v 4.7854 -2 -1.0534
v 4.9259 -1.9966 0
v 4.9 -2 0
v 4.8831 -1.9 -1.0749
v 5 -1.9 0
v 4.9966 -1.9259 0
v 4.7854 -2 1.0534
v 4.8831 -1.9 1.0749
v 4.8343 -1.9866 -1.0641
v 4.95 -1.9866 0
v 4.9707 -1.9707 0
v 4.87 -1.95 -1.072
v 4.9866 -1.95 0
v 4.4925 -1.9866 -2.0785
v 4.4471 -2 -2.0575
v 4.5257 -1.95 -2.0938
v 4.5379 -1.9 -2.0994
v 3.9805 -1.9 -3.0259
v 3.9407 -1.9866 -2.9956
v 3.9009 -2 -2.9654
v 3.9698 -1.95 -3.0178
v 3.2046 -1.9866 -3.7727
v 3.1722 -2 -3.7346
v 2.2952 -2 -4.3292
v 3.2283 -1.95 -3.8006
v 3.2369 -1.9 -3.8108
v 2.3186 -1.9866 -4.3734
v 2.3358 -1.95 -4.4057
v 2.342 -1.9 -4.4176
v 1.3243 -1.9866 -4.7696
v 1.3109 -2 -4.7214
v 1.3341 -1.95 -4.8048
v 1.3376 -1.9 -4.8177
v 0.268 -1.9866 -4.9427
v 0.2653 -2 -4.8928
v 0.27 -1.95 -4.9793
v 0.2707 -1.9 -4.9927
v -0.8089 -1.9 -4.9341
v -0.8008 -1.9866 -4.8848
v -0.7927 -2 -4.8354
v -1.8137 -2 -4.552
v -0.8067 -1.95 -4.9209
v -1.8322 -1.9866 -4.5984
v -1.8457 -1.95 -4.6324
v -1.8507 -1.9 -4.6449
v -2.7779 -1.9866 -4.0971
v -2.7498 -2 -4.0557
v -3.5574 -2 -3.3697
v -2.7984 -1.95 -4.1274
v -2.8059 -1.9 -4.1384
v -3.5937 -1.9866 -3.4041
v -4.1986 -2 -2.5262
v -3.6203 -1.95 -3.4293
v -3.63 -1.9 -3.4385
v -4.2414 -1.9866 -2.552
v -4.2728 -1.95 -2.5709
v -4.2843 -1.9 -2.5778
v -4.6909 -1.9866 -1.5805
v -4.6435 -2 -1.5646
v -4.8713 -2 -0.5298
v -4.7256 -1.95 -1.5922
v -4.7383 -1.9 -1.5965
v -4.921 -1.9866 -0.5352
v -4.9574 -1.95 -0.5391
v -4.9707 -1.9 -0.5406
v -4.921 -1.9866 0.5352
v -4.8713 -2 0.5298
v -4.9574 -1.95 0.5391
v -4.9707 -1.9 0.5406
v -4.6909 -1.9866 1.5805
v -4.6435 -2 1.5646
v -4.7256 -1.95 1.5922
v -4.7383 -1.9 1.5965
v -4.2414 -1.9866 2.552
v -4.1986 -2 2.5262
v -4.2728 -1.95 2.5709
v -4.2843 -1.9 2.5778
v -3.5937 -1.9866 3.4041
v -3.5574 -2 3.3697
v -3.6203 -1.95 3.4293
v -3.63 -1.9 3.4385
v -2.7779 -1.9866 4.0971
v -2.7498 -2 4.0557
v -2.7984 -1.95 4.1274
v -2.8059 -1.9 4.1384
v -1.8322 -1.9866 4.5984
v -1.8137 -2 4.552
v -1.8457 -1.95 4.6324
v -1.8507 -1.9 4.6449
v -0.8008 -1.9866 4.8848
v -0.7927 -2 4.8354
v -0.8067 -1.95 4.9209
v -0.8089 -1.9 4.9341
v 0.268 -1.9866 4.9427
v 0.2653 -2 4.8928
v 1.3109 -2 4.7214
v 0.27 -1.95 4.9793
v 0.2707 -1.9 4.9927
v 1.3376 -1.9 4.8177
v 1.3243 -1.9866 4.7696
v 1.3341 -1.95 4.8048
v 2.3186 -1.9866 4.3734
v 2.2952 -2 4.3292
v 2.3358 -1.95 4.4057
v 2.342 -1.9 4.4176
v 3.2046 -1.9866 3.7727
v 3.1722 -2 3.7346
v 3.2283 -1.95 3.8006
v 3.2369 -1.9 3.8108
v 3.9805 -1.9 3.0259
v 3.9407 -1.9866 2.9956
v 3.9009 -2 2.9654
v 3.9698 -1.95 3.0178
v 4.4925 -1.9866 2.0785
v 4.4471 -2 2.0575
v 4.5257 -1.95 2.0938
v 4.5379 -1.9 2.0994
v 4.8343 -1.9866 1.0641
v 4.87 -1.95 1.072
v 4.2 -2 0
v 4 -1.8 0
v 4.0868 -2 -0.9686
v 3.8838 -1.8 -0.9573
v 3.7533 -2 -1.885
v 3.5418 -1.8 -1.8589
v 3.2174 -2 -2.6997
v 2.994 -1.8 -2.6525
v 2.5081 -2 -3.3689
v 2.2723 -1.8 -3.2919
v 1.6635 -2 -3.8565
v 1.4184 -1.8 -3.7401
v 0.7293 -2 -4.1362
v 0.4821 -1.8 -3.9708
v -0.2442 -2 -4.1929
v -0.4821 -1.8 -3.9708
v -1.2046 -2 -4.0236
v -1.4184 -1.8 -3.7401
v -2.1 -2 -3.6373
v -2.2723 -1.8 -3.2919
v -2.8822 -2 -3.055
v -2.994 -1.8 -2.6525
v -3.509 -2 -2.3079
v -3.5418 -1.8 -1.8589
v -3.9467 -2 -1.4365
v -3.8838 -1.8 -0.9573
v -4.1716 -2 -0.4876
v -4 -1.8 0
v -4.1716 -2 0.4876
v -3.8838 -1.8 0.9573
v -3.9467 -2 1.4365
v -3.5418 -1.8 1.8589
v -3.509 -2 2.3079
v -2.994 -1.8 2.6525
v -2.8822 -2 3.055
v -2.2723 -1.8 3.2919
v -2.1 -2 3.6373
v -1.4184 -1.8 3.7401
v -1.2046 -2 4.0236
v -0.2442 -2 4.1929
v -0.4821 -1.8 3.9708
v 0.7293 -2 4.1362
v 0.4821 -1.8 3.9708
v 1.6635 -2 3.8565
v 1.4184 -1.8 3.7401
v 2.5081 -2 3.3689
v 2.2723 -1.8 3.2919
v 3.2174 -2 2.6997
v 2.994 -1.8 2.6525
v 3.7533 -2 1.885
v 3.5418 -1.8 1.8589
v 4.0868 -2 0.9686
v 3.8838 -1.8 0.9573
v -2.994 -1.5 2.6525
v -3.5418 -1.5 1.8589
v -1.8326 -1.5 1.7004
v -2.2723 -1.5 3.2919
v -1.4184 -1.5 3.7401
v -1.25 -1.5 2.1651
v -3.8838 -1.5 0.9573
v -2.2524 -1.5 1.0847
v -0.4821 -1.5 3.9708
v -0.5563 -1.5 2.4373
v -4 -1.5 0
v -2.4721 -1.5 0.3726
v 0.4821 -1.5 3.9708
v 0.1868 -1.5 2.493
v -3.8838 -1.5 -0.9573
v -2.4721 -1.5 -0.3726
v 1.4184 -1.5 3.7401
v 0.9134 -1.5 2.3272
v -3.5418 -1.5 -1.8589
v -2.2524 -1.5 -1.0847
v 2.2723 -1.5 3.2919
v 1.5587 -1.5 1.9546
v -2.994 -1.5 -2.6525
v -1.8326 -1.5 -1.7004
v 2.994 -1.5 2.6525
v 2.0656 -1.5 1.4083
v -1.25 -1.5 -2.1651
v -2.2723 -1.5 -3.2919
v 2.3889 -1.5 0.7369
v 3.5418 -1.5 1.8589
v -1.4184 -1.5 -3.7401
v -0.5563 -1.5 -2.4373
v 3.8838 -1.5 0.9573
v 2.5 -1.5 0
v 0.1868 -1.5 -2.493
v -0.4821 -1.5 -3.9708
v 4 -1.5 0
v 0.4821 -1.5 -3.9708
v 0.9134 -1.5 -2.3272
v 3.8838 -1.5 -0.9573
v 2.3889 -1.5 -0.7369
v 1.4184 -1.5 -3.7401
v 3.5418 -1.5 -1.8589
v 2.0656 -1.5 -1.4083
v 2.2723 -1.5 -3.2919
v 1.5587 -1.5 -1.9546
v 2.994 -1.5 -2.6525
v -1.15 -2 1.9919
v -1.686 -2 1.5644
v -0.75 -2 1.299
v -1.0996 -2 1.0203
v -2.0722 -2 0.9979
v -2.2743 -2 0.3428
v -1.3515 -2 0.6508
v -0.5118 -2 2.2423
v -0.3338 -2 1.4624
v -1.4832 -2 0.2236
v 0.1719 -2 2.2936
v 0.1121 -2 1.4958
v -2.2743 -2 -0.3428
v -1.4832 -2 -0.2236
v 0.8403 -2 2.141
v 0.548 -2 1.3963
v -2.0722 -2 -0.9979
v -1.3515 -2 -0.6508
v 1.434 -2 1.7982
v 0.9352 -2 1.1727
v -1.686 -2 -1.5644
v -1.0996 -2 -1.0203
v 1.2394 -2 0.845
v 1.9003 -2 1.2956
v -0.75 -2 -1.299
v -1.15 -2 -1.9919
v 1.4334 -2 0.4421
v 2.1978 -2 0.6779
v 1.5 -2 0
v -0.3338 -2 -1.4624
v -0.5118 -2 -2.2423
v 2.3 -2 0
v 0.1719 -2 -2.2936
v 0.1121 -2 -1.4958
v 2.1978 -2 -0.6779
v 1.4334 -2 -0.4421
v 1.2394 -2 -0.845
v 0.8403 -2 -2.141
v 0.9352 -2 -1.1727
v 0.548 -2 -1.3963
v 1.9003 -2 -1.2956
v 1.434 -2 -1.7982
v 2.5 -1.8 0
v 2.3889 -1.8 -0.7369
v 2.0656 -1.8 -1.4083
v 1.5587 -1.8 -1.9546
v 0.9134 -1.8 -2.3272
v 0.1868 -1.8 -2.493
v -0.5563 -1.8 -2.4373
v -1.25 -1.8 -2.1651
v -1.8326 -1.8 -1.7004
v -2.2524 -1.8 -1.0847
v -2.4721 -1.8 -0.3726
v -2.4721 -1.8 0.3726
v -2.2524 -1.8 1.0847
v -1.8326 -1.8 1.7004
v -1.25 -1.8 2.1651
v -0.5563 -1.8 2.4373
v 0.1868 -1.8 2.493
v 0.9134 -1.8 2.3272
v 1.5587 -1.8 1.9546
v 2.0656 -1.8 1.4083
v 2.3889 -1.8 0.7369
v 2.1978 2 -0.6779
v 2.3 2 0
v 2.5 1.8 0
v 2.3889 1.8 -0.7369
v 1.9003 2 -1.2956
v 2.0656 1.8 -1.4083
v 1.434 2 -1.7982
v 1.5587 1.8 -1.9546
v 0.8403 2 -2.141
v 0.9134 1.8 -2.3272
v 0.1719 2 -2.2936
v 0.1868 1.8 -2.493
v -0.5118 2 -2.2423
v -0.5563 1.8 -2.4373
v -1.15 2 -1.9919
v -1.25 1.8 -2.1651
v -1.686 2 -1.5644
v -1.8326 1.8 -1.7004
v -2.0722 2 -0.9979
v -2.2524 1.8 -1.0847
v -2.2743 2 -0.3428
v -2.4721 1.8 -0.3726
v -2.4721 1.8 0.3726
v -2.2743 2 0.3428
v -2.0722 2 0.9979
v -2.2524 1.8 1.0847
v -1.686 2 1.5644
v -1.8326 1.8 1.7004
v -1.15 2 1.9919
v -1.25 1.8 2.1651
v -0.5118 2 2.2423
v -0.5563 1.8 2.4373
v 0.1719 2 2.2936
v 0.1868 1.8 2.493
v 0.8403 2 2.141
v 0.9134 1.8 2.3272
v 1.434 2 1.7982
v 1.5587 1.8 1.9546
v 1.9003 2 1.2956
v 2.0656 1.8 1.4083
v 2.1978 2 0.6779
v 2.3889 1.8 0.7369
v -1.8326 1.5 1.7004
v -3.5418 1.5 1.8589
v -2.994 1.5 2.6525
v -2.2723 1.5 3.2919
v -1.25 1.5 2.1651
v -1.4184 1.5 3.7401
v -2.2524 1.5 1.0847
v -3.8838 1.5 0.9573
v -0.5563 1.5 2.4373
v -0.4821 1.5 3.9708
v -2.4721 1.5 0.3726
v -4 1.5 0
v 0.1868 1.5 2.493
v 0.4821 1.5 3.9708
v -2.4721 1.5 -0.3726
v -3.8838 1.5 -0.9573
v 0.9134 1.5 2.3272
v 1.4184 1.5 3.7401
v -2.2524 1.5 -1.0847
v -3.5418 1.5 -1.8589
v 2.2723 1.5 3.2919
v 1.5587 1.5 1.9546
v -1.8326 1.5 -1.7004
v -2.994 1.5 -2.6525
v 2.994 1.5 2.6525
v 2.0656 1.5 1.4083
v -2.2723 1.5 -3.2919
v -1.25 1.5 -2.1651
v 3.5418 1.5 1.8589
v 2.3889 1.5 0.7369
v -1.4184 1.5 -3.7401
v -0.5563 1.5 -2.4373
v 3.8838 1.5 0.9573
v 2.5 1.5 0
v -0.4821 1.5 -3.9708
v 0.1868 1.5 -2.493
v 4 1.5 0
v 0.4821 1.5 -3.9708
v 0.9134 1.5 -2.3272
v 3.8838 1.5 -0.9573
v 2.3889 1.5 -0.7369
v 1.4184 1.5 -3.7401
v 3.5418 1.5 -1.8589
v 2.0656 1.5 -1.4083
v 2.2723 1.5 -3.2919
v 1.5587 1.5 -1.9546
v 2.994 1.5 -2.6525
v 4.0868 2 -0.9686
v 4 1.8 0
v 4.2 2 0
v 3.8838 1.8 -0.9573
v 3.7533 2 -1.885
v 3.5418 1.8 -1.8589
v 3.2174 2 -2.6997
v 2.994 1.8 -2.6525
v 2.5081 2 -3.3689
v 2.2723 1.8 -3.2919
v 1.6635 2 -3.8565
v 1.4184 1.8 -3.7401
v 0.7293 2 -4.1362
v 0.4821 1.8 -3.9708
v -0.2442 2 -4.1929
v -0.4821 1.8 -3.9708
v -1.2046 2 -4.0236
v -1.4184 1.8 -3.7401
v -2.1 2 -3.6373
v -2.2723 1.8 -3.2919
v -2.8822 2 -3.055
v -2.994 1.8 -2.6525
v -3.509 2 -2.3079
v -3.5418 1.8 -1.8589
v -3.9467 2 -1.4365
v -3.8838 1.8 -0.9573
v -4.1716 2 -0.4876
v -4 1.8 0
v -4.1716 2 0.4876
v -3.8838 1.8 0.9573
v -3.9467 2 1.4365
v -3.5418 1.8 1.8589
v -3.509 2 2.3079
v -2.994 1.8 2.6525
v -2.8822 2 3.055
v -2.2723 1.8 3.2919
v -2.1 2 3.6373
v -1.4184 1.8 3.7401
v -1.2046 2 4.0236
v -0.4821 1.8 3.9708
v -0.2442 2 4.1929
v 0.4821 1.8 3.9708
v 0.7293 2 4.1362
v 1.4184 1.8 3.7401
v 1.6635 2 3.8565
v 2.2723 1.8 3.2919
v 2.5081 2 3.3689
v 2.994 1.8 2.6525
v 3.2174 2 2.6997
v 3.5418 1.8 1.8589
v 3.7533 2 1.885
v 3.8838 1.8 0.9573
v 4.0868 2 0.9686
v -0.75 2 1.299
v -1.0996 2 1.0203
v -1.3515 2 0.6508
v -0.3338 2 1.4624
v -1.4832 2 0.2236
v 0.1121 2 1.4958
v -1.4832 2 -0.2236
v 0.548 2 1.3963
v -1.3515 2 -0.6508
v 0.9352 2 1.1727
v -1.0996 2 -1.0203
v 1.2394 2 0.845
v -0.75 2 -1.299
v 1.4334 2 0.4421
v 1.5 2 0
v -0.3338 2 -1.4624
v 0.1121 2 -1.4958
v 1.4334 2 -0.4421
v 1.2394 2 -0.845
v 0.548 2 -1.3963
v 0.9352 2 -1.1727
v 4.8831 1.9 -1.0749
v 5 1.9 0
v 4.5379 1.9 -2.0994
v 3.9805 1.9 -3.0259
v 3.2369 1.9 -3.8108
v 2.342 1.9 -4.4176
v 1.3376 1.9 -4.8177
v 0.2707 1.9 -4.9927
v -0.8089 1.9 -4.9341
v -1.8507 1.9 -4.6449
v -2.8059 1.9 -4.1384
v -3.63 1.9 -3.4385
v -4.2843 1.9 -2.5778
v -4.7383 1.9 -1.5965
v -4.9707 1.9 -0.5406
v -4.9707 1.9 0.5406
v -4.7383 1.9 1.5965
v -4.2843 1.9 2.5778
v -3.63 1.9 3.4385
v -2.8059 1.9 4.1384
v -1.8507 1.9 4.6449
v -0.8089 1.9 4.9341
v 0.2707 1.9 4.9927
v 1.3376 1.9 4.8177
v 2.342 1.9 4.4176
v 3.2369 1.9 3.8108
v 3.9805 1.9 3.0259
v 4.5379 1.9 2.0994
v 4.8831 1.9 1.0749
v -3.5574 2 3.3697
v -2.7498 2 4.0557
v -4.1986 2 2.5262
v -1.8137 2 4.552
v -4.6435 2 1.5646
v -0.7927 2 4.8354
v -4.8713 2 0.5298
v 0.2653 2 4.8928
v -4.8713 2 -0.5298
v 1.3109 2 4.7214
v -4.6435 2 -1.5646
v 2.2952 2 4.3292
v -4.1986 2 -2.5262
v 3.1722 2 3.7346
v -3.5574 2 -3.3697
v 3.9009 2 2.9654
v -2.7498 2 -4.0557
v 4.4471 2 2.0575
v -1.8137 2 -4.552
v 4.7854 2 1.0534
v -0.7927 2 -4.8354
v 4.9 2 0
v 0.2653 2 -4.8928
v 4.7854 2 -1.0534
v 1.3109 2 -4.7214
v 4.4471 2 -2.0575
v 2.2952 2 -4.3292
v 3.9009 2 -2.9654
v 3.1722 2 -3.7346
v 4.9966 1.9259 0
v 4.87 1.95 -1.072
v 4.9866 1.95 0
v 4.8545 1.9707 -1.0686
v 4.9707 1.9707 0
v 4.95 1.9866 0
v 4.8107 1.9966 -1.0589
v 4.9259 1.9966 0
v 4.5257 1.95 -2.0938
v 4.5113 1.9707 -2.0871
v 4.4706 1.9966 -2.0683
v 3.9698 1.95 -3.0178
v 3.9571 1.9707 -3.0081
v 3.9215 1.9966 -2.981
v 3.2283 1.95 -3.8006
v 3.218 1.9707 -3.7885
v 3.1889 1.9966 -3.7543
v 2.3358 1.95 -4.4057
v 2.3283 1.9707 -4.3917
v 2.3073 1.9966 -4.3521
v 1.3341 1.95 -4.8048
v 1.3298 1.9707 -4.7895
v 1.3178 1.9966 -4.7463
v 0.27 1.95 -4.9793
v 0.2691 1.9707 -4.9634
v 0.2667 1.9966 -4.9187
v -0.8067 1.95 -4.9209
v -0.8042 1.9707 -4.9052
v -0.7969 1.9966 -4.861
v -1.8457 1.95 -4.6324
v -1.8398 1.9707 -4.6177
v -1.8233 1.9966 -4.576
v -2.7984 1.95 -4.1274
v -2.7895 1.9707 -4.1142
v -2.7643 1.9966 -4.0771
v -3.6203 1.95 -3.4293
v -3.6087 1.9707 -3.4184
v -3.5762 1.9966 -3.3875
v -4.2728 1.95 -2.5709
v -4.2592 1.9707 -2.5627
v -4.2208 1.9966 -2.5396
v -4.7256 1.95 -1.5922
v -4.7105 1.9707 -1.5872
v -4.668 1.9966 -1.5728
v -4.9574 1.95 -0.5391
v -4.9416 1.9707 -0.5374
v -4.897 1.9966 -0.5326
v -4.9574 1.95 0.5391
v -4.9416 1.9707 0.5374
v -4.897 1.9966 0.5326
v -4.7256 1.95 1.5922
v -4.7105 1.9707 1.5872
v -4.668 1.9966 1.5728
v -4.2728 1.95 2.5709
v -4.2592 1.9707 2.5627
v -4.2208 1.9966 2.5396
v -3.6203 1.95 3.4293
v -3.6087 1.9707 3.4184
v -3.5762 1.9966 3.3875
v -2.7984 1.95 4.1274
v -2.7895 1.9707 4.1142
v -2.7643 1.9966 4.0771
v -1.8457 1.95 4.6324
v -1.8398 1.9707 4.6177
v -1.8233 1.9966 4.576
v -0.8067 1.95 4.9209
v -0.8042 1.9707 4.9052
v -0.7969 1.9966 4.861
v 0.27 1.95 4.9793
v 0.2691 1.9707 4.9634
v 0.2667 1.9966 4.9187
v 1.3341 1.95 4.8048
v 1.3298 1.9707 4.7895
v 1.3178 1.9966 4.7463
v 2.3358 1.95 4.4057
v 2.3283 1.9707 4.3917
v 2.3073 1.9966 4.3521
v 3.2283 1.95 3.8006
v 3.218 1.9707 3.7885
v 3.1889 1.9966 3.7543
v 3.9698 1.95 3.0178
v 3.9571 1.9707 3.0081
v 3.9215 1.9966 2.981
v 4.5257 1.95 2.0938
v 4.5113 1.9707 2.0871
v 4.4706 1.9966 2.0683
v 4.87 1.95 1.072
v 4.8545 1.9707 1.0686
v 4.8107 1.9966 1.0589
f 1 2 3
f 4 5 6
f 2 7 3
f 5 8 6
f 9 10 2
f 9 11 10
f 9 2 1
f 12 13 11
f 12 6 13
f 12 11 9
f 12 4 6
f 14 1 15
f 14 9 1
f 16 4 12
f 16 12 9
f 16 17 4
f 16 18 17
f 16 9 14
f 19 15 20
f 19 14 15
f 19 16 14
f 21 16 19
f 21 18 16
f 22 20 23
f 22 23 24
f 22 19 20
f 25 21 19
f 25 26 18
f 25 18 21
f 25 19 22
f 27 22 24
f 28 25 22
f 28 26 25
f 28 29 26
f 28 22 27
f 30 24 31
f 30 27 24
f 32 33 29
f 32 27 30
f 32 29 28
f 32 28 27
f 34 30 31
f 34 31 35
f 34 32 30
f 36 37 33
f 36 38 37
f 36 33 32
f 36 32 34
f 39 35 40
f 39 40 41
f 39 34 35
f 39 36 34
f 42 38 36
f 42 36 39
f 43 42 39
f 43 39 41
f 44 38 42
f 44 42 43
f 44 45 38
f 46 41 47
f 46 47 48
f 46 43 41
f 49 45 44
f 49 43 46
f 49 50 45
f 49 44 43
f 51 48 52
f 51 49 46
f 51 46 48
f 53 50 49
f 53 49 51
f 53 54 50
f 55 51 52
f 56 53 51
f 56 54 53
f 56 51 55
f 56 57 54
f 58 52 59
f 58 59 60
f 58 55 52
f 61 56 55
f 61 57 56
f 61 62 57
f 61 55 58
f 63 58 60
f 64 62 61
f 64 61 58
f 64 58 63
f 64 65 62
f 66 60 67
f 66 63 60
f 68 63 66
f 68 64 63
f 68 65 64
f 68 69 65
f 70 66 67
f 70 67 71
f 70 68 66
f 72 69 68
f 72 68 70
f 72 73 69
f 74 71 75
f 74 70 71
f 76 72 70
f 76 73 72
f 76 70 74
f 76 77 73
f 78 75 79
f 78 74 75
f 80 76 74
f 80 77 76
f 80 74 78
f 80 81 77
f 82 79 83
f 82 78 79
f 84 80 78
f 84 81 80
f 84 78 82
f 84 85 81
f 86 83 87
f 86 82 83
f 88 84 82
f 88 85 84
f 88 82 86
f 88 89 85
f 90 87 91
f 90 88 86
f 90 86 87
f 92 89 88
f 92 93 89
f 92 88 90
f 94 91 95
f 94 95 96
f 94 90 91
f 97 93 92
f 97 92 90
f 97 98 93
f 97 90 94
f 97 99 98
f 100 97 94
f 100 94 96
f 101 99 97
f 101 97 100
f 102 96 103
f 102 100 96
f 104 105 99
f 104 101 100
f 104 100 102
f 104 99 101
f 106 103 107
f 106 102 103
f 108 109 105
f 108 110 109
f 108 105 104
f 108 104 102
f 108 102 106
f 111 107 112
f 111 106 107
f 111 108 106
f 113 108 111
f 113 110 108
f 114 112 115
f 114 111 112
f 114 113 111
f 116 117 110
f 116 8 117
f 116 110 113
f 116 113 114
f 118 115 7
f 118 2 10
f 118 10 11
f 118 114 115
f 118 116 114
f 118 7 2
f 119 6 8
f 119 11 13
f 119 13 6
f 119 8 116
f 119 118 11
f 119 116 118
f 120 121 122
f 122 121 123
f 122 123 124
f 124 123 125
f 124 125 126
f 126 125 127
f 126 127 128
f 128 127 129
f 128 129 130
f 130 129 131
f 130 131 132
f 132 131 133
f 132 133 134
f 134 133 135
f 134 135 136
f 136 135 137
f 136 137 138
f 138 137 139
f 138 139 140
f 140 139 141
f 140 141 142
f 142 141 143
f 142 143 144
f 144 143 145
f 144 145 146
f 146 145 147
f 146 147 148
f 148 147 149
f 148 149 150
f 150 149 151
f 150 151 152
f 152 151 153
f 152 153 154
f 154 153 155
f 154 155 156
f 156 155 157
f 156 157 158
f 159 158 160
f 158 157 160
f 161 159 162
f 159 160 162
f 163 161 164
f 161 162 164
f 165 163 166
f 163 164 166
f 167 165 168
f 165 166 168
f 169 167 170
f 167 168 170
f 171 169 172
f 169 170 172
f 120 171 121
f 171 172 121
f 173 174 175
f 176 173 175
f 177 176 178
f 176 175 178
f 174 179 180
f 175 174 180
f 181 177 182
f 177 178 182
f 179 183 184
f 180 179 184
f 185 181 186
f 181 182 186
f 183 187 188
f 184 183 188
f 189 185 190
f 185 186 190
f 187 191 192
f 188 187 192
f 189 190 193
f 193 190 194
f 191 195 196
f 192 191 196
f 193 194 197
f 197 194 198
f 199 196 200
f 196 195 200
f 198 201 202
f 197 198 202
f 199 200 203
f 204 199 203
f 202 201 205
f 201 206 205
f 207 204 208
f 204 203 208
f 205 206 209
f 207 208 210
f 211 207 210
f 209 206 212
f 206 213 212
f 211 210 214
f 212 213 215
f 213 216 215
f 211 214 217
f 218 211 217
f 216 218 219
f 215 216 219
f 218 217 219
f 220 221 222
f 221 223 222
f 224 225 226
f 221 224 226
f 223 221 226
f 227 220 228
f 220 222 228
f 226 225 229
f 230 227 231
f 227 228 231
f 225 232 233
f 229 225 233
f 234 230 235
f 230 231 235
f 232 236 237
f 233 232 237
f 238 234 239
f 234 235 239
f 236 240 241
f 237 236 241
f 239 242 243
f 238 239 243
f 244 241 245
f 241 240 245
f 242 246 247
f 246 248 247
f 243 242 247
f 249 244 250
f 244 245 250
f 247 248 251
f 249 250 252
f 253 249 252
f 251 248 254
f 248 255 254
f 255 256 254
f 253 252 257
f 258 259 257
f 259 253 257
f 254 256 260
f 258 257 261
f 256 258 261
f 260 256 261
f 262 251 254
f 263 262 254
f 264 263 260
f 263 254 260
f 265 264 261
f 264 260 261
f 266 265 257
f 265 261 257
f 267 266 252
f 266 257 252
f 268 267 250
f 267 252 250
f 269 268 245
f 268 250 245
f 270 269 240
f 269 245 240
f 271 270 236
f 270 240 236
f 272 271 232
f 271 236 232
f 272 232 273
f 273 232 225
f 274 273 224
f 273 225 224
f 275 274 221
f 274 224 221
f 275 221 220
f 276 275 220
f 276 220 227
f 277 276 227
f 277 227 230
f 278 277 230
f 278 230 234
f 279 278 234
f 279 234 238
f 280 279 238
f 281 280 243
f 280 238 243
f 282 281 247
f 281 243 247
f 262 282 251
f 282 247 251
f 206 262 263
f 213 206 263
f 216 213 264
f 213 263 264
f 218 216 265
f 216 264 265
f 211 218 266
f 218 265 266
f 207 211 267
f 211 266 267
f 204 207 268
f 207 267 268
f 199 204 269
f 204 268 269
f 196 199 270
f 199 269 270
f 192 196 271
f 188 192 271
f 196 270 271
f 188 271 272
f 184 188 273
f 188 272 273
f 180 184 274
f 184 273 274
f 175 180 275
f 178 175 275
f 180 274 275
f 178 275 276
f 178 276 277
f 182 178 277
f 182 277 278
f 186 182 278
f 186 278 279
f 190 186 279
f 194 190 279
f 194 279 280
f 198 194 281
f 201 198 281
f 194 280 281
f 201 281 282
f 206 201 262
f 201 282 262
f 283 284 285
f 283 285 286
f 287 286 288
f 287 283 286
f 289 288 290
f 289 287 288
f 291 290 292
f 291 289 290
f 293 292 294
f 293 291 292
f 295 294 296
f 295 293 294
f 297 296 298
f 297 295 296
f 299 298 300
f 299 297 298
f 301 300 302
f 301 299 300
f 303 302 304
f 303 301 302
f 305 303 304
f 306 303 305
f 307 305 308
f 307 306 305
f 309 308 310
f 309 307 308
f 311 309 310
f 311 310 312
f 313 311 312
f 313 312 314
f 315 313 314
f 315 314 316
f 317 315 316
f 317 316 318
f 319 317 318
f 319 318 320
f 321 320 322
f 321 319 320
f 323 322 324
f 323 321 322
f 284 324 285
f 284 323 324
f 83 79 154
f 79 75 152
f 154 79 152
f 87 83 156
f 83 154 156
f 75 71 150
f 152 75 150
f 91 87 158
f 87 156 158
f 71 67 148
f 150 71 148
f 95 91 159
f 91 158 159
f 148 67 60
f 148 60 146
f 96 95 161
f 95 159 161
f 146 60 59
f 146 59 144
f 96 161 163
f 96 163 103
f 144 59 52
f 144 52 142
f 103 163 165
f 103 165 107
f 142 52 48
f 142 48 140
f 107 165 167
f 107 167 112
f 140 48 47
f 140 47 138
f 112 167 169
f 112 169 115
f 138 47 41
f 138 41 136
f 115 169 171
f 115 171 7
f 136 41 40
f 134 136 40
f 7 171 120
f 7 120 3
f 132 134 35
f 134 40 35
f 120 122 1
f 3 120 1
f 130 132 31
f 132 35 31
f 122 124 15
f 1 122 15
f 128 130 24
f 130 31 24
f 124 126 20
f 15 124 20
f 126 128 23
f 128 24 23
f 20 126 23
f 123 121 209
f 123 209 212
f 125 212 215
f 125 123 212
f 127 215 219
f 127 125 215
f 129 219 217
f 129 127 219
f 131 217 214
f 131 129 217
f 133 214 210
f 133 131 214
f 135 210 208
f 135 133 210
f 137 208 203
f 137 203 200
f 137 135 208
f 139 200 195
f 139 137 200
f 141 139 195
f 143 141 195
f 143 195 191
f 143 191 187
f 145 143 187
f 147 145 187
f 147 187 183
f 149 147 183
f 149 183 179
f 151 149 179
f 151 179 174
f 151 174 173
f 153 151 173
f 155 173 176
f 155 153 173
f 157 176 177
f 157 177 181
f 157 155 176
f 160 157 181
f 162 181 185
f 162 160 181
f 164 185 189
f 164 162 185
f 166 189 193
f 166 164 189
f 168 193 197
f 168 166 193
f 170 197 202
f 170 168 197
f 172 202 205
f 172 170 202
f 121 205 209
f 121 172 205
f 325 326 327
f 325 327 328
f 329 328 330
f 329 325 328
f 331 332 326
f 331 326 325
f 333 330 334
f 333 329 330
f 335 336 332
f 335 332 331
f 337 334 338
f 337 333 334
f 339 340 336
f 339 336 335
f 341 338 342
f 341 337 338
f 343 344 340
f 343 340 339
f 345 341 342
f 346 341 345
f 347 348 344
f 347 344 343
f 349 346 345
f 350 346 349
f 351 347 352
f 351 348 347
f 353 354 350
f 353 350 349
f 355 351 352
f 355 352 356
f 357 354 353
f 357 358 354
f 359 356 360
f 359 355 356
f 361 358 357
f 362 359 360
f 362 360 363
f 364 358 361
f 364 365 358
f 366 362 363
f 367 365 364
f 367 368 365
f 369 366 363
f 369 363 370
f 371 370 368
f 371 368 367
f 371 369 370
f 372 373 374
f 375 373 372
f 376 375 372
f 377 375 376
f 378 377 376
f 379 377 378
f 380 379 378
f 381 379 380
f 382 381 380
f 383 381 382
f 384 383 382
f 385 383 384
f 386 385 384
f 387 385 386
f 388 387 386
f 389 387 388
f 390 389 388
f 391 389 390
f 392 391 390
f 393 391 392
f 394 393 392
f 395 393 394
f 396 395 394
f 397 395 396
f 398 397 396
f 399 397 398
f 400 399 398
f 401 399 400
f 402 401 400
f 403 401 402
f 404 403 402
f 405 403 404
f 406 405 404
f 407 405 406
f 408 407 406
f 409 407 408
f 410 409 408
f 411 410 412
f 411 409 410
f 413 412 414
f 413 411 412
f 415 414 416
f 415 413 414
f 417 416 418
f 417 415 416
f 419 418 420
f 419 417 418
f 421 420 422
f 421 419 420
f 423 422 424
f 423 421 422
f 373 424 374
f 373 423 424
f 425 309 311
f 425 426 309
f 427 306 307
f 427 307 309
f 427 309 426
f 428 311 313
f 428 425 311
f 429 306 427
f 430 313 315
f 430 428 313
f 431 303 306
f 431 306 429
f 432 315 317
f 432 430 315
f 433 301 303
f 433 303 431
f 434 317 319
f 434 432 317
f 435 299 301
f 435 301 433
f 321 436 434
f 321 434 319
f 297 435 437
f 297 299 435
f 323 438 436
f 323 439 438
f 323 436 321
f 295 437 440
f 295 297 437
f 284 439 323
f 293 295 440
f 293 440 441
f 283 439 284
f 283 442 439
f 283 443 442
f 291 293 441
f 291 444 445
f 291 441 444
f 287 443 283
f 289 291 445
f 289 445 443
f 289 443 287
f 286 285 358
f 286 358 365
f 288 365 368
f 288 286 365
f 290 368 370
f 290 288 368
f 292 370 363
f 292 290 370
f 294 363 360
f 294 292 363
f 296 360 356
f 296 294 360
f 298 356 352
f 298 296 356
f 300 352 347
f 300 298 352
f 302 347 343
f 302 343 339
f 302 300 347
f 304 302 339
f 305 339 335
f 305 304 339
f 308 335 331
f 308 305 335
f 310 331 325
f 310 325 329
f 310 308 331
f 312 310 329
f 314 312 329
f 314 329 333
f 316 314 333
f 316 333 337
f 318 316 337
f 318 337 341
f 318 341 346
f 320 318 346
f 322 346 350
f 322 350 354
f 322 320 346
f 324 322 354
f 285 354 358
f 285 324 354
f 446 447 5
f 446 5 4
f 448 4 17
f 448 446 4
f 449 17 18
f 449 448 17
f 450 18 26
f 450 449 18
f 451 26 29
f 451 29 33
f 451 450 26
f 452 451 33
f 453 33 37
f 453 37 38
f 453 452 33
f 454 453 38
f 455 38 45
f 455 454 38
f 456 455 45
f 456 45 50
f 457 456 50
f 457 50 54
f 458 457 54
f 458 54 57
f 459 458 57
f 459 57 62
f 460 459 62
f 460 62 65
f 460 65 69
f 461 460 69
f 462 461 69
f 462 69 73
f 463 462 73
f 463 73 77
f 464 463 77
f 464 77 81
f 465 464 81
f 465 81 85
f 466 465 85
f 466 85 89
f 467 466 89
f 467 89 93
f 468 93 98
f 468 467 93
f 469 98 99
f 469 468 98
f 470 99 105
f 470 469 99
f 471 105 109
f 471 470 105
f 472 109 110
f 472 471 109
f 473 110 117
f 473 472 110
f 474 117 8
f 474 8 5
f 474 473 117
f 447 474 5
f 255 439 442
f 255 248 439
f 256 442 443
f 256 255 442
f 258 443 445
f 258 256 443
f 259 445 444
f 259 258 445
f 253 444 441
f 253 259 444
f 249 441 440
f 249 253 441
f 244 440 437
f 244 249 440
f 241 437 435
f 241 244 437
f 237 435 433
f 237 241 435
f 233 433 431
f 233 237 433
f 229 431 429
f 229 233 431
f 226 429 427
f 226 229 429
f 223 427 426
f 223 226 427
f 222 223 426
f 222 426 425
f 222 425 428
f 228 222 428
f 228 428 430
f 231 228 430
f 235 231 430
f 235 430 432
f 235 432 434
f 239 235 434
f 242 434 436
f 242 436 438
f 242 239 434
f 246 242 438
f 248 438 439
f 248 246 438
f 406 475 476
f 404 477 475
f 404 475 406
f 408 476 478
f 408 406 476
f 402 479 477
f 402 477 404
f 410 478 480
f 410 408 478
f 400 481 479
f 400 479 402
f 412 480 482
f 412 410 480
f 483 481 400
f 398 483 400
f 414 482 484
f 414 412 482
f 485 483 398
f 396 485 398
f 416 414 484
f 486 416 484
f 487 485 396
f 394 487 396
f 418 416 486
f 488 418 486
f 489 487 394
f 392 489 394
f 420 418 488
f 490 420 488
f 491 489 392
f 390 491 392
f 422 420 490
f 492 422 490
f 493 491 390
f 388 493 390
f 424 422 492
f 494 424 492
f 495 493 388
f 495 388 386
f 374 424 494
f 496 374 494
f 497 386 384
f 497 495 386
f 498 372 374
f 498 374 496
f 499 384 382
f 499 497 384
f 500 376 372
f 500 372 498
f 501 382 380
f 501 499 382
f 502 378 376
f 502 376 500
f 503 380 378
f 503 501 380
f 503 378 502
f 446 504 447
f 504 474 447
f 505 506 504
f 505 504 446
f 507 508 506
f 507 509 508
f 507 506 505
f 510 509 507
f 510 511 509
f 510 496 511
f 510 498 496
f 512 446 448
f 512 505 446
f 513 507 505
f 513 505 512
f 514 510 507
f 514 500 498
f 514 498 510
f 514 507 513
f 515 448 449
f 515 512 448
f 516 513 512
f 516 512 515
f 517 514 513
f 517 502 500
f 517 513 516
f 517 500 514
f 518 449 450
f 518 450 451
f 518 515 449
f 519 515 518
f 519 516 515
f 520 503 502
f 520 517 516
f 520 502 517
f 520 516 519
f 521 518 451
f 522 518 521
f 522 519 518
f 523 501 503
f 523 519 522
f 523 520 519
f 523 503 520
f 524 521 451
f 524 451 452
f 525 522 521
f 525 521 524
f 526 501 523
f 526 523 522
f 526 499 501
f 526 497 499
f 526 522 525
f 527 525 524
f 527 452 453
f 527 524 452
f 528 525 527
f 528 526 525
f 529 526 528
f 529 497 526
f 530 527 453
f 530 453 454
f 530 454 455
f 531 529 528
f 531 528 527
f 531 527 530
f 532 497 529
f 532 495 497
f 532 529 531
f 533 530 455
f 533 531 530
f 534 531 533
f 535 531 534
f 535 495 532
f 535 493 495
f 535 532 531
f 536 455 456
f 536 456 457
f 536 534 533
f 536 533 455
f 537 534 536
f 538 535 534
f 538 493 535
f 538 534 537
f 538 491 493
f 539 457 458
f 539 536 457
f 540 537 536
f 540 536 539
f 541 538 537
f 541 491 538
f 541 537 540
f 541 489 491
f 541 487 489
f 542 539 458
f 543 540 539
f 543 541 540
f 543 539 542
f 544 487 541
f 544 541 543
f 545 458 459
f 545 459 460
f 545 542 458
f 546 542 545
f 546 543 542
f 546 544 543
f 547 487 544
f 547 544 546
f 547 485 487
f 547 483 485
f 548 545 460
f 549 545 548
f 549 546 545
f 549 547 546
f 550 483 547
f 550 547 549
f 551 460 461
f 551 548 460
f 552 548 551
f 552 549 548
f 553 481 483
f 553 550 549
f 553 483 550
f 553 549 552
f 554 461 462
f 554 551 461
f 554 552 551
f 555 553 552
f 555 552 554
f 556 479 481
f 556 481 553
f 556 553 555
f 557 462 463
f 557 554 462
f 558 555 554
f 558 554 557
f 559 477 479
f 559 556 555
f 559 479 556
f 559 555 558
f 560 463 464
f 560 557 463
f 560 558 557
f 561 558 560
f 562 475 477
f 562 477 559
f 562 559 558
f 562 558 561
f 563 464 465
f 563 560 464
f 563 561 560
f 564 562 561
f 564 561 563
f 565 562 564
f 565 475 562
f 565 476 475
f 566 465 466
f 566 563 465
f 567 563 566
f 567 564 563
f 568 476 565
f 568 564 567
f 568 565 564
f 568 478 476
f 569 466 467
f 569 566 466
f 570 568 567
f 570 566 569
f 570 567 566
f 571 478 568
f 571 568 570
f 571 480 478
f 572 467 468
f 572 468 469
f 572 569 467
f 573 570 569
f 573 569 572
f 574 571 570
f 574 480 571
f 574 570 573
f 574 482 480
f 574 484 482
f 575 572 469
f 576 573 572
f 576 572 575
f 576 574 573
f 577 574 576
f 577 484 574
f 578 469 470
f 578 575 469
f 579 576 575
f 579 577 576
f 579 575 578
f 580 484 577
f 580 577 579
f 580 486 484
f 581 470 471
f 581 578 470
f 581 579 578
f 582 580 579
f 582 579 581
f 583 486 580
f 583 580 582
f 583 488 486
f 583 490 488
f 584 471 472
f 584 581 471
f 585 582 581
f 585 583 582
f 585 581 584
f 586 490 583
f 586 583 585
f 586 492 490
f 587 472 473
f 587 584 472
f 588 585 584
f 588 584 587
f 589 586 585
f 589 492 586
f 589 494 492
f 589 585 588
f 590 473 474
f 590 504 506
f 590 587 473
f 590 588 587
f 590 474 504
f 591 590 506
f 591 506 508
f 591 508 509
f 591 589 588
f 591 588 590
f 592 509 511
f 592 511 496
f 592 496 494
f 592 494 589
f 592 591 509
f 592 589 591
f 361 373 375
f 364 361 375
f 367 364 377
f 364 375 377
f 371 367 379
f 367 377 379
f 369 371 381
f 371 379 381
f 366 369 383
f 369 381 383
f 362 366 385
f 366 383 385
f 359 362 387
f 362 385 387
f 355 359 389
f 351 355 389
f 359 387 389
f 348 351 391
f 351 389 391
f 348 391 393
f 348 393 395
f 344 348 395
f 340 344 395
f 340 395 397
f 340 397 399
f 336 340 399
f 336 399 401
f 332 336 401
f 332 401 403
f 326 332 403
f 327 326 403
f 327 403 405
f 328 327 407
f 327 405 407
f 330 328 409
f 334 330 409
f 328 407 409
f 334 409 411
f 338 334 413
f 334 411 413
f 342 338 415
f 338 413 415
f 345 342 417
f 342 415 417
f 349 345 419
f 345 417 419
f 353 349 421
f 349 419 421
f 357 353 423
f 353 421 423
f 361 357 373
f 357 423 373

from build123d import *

# Parameters (mm, degrees)
SKETCH2_R           = 5
SKETCH2_R_2         = 1.5
BOSS_EXTRUDE1_DEPTH = 2
SKETCH3_R           = 4
SKETCH3_R_2         = 2.5
CUT_EXTRUDE1_DEPTH  = 0.5
CHAMFER1_SIZE       = 0.2
FILLET1_R           = 0.1


with BuildPart() as part:
    # Sketch2 → Boss-Extrude1 (new body, symmetric)
    with BuildSketch(Plane(origin=(0, 0, 0), x_dir=(1, 0, 0), z_dir=(0, 1, 0))):
        Circle(SKETCH2_R)
        Circle(SKETCH2_R_2, mode=Mode.SUBTRACT)
    extrude(amount=BOSS_EXTRUDE1_DEPTH, both=True)

    # Sketch3 → Cut-Extrude1 (cut)
    with BuildSketch(Plane(origin=(0, 2, 0), x_dir=(1, 0, 0), z_dir=(0, 1, 0))):
        Circle(SKETCH3_R)
        Circle(SKETCH3_R_2, mode=Mode.SUBTRACT)
    cut_extrude1 = extrude(amount=-CUT_EXTRUDE1_DEPTH, mode=Mode.SUBTRACT)

    # Mirror1: Cut-Extrude1 across plane
    add(cut_extrude1.mirror(Plane.ZX), mode=Mode.SUBTRACT)

    # Chamfer1
    chamfer1_edges = [part.edges().sort_by_distance(p)[0] for p in [
        (-4, 2, 0),
        (-2.5, 2, 0),
        (-2.5, -2, 0),
        (-4, -2, 0),
    ]]
    chamfer(chamfer1_edges, length=CHAMFER1_SIZE)

    # Fillet1
    fillet1_edges = [part.edges().sort_by_distance(p)[0] for p in [
        (-5, -2, 0),
        (-5, 2, 0),
    ]]
    fillet(fillet1_edges, radius=FILLET1_R)


solid = part.part
